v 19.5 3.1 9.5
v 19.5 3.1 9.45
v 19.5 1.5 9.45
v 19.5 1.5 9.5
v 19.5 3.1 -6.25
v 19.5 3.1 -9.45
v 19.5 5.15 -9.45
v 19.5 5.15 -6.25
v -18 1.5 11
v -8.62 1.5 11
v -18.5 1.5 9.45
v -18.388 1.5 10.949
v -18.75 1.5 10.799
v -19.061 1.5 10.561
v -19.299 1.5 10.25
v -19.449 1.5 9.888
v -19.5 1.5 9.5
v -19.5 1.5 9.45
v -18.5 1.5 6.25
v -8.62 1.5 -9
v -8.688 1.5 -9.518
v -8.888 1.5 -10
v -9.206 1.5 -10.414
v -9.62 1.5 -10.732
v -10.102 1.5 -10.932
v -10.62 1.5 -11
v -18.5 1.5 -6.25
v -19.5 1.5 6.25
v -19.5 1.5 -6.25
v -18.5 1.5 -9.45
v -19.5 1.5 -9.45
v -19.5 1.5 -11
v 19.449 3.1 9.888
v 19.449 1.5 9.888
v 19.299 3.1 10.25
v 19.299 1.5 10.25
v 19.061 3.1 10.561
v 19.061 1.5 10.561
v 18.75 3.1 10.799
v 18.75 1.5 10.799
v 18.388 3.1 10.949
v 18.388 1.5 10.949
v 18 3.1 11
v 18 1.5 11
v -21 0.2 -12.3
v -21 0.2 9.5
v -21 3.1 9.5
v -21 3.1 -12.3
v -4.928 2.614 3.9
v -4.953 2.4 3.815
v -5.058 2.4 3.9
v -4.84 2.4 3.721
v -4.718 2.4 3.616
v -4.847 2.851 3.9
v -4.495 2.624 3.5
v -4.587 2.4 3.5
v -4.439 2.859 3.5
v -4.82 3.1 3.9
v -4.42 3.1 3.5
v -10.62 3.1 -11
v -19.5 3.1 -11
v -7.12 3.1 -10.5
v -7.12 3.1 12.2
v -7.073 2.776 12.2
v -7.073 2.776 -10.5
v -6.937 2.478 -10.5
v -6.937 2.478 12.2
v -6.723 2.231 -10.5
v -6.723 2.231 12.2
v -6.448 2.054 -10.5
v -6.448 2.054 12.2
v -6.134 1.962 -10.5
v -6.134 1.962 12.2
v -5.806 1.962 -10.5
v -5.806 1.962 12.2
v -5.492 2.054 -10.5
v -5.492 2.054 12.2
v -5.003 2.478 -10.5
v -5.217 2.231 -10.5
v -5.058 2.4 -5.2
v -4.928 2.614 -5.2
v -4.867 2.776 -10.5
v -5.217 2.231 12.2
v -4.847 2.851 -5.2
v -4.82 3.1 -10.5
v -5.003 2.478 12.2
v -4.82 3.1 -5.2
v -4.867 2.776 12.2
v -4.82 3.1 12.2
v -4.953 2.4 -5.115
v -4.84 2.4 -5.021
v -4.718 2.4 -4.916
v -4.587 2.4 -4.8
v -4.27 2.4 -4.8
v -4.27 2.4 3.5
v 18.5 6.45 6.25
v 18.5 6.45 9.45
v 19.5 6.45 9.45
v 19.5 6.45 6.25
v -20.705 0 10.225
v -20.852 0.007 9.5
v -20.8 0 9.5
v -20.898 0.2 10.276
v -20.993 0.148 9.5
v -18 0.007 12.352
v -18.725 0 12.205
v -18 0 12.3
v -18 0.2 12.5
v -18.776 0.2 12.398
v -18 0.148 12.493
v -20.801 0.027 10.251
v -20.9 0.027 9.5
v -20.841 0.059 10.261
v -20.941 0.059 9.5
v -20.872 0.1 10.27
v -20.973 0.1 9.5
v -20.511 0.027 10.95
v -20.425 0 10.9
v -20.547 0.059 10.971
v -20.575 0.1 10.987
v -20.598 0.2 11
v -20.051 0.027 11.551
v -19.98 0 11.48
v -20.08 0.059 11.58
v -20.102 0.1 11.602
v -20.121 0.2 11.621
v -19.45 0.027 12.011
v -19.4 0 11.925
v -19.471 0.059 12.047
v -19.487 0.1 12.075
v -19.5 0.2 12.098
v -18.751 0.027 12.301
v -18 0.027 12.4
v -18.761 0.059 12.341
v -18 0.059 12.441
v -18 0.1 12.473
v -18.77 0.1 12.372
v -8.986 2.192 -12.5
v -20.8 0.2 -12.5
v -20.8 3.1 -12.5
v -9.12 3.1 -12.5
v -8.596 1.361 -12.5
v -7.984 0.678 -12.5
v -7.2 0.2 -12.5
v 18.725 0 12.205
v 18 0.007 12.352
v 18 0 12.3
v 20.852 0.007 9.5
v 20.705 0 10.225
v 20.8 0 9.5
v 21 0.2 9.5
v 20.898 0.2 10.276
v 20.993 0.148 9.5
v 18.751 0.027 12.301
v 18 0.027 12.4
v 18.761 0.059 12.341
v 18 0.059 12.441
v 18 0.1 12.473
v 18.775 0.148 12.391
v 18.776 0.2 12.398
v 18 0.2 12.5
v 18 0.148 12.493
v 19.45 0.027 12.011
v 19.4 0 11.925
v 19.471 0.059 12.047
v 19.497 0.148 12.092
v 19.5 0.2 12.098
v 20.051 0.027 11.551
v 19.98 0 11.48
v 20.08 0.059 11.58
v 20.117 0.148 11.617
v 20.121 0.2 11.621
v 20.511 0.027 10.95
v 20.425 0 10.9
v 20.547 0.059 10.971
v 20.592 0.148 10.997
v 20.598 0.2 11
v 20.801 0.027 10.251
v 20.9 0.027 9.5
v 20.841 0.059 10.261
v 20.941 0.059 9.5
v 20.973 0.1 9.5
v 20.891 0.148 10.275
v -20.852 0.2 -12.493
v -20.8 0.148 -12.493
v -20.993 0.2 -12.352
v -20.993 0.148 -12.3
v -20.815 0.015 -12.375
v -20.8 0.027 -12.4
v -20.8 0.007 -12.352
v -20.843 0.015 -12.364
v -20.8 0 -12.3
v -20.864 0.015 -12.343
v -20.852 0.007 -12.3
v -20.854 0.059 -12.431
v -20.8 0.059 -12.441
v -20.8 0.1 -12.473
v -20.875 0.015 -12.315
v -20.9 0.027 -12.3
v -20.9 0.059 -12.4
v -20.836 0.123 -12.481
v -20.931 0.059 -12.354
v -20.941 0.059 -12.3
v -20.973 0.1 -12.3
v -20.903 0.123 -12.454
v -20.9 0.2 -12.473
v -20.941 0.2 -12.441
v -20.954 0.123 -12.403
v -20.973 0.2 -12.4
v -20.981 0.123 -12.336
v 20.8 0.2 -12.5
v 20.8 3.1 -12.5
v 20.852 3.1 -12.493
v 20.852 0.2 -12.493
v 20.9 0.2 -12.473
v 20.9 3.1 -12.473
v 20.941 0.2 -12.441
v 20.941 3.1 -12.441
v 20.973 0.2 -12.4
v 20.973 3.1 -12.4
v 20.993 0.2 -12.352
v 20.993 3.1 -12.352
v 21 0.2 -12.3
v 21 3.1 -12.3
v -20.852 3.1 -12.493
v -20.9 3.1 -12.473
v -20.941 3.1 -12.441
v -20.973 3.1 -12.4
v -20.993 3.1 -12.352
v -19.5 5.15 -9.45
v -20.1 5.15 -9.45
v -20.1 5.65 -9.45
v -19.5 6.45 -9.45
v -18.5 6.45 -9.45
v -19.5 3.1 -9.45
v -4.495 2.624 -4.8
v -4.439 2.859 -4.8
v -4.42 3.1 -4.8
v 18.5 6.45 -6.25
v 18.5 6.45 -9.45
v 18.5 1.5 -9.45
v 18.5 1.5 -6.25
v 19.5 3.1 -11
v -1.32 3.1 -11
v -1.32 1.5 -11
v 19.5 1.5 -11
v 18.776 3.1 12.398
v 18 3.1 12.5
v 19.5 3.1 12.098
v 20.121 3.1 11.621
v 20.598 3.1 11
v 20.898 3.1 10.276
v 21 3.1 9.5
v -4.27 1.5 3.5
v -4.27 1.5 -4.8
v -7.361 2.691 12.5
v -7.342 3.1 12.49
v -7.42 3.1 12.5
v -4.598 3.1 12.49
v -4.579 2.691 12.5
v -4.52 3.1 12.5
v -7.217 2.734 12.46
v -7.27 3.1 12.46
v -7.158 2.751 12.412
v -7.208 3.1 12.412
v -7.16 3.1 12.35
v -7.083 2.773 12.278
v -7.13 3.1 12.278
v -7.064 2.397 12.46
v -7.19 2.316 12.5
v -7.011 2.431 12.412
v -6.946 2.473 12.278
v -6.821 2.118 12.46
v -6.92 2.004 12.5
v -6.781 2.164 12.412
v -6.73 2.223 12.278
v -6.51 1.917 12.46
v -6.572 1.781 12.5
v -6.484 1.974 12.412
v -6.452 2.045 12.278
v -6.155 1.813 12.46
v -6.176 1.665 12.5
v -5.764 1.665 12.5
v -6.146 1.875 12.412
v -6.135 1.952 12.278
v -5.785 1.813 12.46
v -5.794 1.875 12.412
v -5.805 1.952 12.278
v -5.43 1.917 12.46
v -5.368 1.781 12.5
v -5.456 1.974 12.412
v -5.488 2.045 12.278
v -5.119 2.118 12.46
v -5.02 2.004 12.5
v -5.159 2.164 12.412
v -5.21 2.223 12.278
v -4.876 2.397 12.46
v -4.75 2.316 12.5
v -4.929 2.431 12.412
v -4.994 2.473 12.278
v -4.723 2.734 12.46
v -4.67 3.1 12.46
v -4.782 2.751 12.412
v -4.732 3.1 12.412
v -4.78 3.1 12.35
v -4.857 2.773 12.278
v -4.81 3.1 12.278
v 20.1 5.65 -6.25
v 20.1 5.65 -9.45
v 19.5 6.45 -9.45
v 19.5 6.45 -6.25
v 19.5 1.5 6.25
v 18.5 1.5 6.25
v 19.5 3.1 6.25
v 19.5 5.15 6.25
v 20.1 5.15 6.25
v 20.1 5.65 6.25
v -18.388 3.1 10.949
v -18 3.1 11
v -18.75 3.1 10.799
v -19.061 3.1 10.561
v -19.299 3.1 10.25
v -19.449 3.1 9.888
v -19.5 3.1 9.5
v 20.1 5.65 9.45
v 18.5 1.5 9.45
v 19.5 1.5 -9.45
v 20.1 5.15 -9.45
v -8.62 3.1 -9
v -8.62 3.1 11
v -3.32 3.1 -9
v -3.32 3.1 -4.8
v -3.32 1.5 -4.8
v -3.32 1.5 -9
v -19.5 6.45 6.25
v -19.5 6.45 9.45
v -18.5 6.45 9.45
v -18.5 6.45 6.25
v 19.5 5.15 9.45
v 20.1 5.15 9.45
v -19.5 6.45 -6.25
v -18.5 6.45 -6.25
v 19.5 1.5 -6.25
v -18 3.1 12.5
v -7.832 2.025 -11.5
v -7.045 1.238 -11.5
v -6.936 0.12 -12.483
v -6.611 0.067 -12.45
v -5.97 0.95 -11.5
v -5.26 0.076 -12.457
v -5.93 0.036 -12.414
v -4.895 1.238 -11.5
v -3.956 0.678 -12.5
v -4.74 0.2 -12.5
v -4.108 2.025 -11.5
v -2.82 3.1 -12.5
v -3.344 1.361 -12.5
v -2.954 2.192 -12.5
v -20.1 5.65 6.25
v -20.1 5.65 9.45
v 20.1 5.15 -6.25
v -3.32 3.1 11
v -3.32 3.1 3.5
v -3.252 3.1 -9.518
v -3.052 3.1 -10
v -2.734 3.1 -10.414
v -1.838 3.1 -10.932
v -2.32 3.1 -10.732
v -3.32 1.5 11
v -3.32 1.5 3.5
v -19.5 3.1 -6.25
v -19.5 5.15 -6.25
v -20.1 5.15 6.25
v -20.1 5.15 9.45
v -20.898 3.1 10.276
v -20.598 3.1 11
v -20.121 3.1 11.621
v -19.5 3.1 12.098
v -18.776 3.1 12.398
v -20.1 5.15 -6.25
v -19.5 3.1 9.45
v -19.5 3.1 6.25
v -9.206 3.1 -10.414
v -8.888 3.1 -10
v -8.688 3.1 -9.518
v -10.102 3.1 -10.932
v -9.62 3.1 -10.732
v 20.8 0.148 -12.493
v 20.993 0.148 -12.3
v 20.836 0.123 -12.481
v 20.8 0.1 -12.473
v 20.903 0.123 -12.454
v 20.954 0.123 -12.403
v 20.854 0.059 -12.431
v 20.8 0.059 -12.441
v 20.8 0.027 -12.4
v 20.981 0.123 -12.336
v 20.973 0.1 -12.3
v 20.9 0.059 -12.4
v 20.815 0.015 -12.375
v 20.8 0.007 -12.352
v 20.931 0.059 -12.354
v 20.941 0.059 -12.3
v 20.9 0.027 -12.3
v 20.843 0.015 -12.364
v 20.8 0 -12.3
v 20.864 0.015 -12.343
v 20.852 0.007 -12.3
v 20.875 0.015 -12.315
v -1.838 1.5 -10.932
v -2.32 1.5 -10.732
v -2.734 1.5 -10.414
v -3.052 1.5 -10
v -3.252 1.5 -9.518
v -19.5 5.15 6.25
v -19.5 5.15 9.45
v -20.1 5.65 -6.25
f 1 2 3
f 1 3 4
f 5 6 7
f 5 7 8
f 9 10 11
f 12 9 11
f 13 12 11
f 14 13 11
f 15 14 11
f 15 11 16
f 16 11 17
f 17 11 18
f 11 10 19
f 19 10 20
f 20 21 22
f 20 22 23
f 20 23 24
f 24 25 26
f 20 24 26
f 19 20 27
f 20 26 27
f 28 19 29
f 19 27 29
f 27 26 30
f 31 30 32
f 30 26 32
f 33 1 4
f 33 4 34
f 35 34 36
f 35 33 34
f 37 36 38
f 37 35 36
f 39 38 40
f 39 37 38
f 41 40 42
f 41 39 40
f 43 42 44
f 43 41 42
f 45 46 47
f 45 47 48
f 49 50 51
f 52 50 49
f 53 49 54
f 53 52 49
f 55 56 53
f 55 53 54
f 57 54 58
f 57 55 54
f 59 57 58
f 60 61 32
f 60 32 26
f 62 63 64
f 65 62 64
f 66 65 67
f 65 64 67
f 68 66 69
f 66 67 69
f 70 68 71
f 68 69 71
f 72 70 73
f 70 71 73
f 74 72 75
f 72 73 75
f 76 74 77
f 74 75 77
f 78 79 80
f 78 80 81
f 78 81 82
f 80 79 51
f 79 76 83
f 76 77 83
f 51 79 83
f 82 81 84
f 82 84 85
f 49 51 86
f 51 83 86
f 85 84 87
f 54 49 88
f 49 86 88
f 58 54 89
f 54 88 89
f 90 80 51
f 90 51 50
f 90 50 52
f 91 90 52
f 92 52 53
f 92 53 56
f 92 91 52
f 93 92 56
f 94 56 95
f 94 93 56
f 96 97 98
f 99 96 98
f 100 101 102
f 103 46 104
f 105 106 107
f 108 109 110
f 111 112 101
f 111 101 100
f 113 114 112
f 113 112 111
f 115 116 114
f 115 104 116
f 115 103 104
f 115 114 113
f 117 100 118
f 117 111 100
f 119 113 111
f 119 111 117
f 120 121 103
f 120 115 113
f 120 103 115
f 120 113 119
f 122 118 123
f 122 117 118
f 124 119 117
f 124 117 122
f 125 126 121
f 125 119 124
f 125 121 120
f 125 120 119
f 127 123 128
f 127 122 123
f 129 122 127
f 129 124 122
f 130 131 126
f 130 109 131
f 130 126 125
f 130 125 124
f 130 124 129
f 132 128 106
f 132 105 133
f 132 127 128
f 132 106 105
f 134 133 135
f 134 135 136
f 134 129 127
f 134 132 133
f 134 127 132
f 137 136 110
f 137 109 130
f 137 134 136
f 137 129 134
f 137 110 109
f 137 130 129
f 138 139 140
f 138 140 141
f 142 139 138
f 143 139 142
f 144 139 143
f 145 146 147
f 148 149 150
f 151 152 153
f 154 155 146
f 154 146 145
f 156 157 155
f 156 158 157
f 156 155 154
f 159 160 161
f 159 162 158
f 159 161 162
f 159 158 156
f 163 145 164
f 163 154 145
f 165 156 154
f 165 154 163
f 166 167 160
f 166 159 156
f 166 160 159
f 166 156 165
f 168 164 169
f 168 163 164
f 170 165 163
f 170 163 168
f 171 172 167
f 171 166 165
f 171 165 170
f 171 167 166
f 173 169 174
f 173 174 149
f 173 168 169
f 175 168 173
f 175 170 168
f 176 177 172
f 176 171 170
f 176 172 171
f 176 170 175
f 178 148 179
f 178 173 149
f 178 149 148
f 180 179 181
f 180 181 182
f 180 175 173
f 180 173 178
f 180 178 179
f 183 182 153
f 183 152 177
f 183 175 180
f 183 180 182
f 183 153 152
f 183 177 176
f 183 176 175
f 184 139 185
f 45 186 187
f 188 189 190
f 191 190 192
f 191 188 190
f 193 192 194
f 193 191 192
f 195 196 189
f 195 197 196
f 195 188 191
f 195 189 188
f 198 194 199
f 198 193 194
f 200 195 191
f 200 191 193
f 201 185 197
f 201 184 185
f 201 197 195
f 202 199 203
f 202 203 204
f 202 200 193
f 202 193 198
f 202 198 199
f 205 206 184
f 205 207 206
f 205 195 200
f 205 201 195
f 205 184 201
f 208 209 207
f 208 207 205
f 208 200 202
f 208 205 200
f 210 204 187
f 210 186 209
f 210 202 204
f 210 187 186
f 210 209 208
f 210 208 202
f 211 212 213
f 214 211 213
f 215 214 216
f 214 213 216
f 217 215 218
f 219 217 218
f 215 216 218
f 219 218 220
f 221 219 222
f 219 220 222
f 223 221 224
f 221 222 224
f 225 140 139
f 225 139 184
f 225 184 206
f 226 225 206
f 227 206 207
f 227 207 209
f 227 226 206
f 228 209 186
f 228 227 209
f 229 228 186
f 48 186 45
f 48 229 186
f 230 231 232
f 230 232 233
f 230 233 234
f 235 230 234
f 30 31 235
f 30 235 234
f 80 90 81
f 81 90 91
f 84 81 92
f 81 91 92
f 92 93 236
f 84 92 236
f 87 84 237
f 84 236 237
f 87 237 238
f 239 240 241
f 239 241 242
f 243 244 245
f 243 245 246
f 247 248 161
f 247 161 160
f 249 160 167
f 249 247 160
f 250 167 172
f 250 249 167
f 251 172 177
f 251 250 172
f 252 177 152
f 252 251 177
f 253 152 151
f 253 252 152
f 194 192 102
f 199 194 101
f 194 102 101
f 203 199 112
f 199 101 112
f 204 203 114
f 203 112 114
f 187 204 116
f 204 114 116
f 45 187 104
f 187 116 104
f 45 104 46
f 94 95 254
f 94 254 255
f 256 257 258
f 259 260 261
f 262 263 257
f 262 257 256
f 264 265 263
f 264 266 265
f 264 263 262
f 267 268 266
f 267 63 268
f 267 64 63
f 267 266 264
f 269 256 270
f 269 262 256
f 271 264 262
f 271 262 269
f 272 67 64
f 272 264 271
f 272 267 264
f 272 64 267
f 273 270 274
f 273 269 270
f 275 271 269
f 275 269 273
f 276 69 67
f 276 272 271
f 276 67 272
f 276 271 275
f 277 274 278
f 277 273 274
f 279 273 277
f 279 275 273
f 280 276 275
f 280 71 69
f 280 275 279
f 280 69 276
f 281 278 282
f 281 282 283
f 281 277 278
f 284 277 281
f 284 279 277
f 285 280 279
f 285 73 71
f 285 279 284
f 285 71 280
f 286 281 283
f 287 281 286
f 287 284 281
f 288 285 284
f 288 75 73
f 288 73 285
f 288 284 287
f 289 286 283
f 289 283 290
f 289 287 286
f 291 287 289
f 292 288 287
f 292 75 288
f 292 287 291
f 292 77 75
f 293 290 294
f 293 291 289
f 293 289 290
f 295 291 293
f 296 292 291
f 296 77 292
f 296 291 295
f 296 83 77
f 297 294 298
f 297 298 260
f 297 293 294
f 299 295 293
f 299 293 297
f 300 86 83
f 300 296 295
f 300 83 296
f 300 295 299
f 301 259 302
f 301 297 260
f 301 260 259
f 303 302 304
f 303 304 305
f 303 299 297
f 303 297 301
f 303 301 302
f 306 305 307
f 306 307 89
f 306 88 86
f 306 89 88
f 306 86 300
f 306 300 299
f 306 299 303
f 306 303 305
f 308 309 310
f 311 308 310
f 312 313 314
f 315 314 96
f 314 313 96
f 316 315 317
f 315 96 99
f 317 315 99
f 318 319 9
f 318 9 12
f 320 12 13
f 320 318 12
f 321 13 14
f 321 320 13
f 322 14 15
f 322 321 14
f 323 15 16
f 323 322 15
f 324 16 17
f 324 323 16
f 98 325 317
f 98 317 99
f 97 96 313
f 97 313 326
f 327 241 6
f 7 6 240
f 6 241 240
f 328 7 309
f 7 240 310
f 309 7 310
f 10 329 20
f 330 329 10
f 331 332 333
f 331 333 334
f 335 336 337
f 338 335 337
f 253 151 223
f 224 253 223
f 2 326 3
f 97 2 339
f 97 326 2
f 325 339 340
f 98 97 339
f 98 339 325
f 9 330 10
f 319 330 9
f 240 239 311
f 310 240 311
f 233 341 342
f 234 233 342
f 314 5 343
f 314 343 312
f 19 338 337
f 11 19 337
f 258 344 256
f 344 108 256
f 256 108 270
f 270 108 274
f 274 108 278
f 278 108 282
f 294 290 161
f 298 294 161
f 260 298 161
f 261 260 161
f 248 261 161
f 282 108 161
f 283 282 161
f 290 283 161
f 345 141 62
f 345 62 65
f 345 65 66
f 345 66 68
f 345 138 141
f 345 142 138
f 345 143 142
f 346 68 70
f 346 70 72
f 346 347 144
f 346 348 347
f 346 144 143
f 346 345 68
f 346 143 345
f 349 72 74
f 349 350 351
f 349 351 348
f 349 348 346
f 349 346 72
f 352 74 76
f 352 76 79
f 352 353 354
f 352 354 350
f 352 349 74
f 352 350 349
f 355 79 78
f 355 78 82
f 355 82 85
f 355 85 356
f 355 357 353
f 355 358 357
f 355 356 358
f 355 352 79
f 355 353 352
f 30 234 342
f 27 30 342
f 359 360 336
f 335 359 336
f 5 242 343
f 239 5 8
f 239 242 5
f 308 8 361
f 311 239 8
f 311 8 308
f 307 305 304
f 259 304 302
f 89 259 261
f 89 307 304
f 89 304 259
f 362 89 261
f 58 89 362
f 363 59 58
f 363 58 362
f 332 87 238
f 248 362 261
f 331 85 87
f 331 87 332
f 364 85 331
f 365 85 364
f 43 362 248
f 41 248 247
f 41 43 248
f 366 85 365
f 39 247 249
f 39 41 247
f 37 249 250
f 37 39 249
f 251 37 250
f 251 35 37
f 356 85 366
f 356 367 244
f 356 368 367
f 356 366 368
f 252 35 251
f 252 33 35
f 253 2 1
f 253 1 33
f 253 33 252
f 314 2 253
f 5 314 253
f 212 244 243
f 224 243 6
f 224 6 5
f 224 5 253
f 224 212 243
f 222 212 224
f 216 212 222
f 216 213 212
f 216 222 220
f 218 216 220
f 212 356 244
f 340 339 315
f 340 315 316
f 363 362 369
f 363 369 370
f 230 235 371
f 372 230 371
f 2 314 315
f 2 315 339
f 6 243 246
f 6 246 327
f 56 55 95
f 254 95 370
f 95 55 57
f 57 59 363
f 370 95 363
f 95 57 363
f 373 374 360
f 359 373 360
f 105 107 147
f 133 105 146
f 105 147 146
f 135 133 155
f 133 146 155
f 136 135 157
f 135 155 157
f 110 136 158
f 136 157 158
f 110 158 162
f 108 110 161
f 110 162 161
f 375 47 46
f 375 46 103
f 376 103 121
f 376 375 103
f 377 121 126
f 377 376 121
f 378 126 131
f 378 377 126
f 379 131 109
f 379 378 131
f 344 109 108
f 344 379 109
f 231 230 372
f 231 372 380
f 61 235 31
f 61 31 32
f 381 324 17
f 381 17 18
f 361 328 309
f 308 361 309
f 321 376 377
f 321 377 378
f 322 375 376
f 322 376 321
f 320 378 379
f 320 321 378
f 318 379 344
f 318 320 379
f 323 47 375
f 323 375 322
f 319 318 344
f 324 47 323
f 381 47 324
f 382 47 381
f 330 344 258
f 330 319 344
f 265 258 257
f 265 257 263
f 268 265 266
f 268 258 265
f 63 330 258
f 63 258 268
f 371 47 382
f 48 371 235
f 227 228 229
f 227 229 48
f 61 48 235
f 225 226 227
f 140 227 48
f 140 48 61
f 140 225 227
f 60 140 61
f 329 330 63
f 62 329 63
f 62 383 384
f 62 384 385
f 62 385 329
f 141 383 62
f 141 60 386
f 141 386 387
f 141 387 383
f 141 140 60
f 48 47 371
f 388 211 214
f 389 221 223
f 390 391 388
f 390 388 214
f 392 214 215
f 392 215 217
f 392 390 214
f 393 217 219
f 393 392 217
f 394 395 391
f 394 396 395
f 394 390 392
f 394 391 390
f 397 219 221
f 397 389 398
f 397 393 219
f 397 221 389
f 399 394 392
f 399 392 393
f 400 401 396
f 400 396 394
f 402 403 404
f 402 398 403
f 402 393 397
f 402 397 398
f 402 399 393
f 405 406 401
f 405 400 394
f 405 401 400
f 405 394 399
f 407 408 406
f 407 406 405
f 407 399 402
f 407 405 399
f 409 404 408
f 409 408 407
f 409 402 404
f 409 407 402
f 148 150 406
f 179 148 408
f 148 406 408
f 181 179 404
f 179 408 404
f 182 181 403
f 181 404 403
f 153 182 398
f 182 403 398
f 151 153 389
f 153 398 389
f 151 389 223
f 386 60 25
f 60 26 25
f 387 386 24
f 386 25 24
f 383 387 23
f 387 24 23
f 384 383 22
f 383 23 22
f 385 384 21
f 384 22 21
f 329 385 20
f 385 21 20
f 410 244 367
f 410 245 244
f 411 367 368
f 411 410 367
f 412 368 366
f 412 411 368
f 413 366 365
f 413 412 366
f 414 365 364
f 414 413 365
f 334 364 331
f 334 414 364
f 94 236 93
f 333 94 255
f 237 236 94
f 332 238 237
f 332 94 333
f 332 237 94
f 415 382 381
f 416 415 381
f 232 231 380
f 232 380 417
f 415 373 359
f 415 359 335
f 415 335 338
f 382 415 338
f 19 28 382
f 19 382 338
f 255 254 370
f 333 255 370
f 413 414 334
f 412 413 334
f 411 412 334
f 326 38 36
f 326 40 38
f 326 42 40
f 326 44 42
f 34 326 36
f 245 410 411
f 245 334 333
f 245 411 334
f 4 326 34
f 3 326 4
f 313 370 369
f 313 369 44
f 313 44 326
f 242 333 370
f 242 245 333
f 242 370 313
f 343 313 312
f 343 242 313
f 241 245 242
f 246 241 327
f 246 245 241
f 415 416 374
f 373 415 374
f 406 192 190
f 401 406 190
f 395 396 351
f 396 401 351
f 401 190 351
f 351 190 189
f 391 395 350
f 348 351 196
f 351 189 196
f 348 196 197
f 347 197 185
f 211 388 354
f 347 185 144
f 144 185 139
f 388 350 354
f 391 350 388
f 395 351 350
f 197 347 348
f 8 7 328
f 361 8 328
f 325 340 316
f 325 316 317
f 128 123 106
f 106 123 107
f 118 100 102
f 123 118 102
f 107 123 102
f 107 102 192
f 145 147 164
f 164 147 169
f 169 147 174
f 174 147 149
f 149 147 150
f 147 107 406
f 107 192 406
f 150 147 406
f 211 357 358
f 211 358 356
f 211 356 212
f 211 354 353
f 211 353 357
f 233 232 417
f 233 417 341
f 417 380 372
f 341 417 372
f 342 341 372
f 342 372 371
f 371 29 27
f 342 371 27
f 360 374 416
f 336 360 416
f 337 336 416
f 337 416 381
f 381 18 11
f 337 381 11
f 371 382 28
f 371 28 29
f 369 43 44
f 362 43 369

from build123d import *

# Parameters (mm, degrees)
SKETCH_1_W          = 42
SKETCH_1_H          = 25
EXTRUDE_1_DEPTH     = 3.1
SKETCH_3_R          = 1.15
CUT_EXTRUDE_1_DEPTH = 33.796493715
SKETCH_5_W          = 15.7
SKETCH_5_H          = 8.3
CUT_EXTRUDE_3_DEPTH = 1.6
FILLET_4_R          = 3
SKETCH_10_W         = 1.324084548
SKETCH_10_H         = 8.3
CUT_EXTRUDE_4_DEPTH = 0.7
CUT_EXTRUDE_5_DEPTH = 1.6
FILLET_5_R          = 0.3
CHAMFER_1_SIZE      = 0.4
CHAMFER_2_SIZE      = 2
FILLET_6_R          = 2
SKETCH_13_W         = 1
SKETCH_13_H         = 3.2
EXTRUDE_2_DEPTH     = 4.95
EXTRUDE_3_DEPTH     = 3.2
FILLET_7_R          = 0.2
FILLET_8_R          = 0.2


with BuildPart() as part:
    # 草图1 → 凸台-拉伸1 (new body)
    with BuildSketch(Plane(origin=(0, 0, 0), x_dir=(1, 0, 0), z_dir=(0, 1, 0))):
        Rectangle(SKETCH_1_W, SKETCH_1_H)
    extrude(amount=EXTRUDE_1_DEPTH)

    # 草图3 → 切除-拉伸1 (cut, through all)
    with BuildSketch(Plane.XY.offset(12.5)):
        with Locations((-5.97, 3.1)):
            Circle(SKETCH_3_R)
    extrude(amount=-CUT_EXTRUDE_1_DEPTH, mode=Mode.SUBTRACT)

    # 草图5 → 切除-拉伸3 (cut)
    with BuildSketch(Plane(origin=(0, 3.1, 0), x_dir=(1, 0, 0), z_dir=(0, 1, 0))):
        with Locations((3.58, 0.65)):
            Rectangle(SKETCH_5_W, SKETCH_5_H)
    extrude(amount=-CUT_EXTRUDE_3_DEPTH, mode=Mode.SUBTRACT)

    # 圆角4
    fillet_4_edges = [part.edges().sort_by_distance(p)[0] for p in [
        (-21, 1.55, 12.5),
        (21, 1.55, 12.5),
    ]]
    fillet(fillet_4_edges, radius=FILLET_4_R)

    # 草图10 → 切除-拉伸4 (cut)
    with BuildSketch(Plane(origin=(0, 3.1, 0), x_dir=(1, 0, 0), z_dir=(0, 1, 0))):
        with Locations((-4.932042274, 0.65)):
            Rectangle(SKETCH_10_W, SKETCH_10_H)
    extrude(amount=-CUT_EXTRUDE_4_DEPTH, mode=Mode.SUBTRACT)

    # 草图11 → 切除-拉伸5 (cut)
    with BuildSketch(Plane(origin=(0, 3.1, 0), x_dir=(1, 0, 0), z_dir=(0, 1, 0))):
        with BuildLine():
            Line((-3.32, -11), (-3.32, 11))
            Line((-3.32, 11), (19.5, 11))
            Line((19.5, 11), (19.5, -9.5))
            ThreePointArc((19.5, -9.5), (19.060660172, -10.560660172), (18, -11))
            Line((18, -11), (-3.32, -11))
        make_face()
        with BuildLine():
            Line((-19.5, 11), (-8.62, 11))
            Line((-8.62, 11), (-8.62, -11))
            Line((-8.62, -11), (-18, -11))
            ThreePointArc((-18, -11), (-19.060660172, -10.560660172), (-19.5, -9.5))
            Line((-19.5, -9.5), (-19.5, 11))
        make_face()
    extrude(amount=-CUT_EXTRUDE_5_DEPTH, mode=Mode.SUBTRACT)

    # 圆角5
    fillet_5_edges = [part.edges().sort_by_distance(p)[0] for p in [
        (-5.97, 1.95, 12.5),
    ]]
    fillet(fillet_5_edges, radius=FILLET_5_R)

    # 倒角1
    chamfer_1_edges = [part.edges().sort_by_distance(p)[0] for p in [
        (-4.881015028, 2.730389757, 3.5),
        (-4.881015028, 2.730389757, -4.8),
    ]]
    chamfer(chamfer_1_edges, length=CHAMFER_1_SIZE)

    # 倒角2
    # the kernel refuses this chamfer: 2 mm, written as the material it takes off along each edge
    with BuildSketch(Plane(origin=(-5.97, 3.1, -12.5), x_dir=(-0.0031415874858793974, 0.9999950652018581, 0), z_dir=(0.9999950652018581, 0.0031415874858793974, 0))) as chamfer_2_piece_1:
        Polygon((1.15, CHAMFER_2_SIZE), (1.15 + CHAMFER_2_SIZE, 0), (1.15, 0), align=None)
    revolve(axis=Axis((-5.97, 3.1, -12.5), (0, 0, 1)), revolution_arc=359.64, mode=Mode.SUBTRACT)

    # 圆角6
    fillet_6_edges = [part.edges().sort_by_distance(p)[0] for p in [
        (-3.32, 2.3, -11),
        (-8.62, 2.3, -11),
    ]]
    fillet(fillet_6_edges, radius=FILLET_6_R)

    # 草图13 → 凸台-拉伸2 (add)
    with BuildSketch(Plane.XZ.offset(-1.5)):
        with Locations((19, 7.85)):
            Rectangle(SKETCH_13_W, SKETCH_13_H)
        with Locations((19, -7.85)):
            Rectangle(SKETCH_13_W, SKETCH_13_H)
        with Locations((-19, -7.85)):
            Rectangle(SKETCH_13_W, SKETCH_13_H)
        with Locations((-19, 7.85)):
            Rectangle(SKETCH_13_W, SKETCH_13_H)
    extrude(amount=-EXTRUDE_2_DEPTH)

    # 草图14 → 凸台-拉伸3 (add)
    with BuildSketch(Plane(origin=(0, 0, -9.45), x_dir=(-1, 0, 0), z_dir=(0, 0, -1))):
        Polygon((-19.5, 6.45), (-19.5, 5.15), (-20.1, 5.15), (-20.1, 5.65), align=None)
        Polygon((20.1, 5.65), (19.5, 6.45), (19.5, 5.15), (20.1, 5.15), align=None)
    extrude_3 = extrude(amount=-EXTRUDE_3_DEPTH)

    # 镜向1: 凸台-拉伸3 across plane
    add(extrude_3.mirror(Plane.XY))

    # 圆角7
    fillet_7_edges = [part.edges().sort_by_distance(p)[0] for p in [
        (-21, 1.55, -12.5),
        (21, 1.55, -12.5),
    ]]
    fillet(fillet_7_edges, radius=FILLET_7_R)

    # 圆角8
    # the kernel refuses this fillet: 0.2 mm, written as the material it takes off along each edge
    with BuildSketch(Plane(origin=(-20.8, 0, -12.3), x_dir=(0, 0, -1), z_dir=(1, 0, 0))) as fillet_8_piece_1:
        with BuildLine():
            CenterArc((0.2 - FILLET_8_R, FILLET_8_R), FILLET_8_R, 270, 90)
            Line((0.2, FILLET_8_R), (0.2 + FILLET_8_R * 0.02, FILLET_8_R))
            Line((0.2 + FILLET_8_R * 0.02, FILLET_8_R), (0.2 + FILLET_8_R * 0.02, -FILLET_8_R * 0.02))
            Line((0.2 + FILLET_8_R * 0.02, -FILLET_8_R * 0.02), (0.2 - FILLET_8_R, -FILLET_8_R * 0.02))
            Line((0.2 - FILLET_8_R, -FILLET_8_R * 0.02), (0.2 - FILLET_8_R, 0))
        make_face()
    revolve(axis=Axis((-20.8, 0, -12.3), (0, 1, 0)), revolution_arc=90, mode=Mode.SUBTRACT)
    with BuildSketch(Plane(origin=(-21, 0, 9.5), x_dir=(1, 0, 0), z_dir=(0, 0, -1))) as fillet_8_piece_2:
        with BuildLine():
            CenterArc((FILLET_8_R, -FILLET_8_R), FILLET_8_R, 90, 90)
            Line((0, -FILLET_8_R), (-FILLET_8_R * 0.02, -FILLET_8_R))
            Line((-FILLET_8_R * 0.02, -FILLET_8_R), (-FILLET_8_R * 0.02, FILLET_8_R * 0.02))
            Line((-FILLET_8_R * 0.02, FILLET_8_R * 0.02), (FILLET_8_R, FILLET_8_R * 0.02))
            Line((FILLET_8_R, FILLET_8_R * 0.02), (FILLET_8_R, 0))
        make_face()
    extrude(amount=21.8, mode=Mode.SUBTRACT)
    with BuildSketch(Plane(origin=(-18, 0, 9.5), x_dir=(-1, 0, 0), z_dir=(0, 0, -1))) as fillet_8_piece_3:
        with BuildLine():
            CenterArc((3 - FILLET_8_R, FILLET_8_R), FILLET_8_R, 270, 90)
            Line((3, FILLET_8_R), (3 + FILLET_8_R * 0.02, FILLET_8_R))
            Line((3 + FILLET_8_R * 0.02, FILLET_8_R), (3 + FILLET_8_R * 0.02, -FILLET_8_R * 0.02))
            Line((3 + FILLET_8_R * 0.02, -FILLET_8_R * 0.02), (3 - FILLET_8_R, -FILLET_8_R * 0.02))
            Line((3 - FILLET_8_R, -FILLET_8_R * 0.02), (3 - FILLET_8_R, 0))
        make_face()
    revolve(axis=Axis((-18, 0, 9.5), (0, 1, 0)), revolution_arc=90, mode=Mode.SUBTRACT)
    with BuildSketch(Plane(origin=(18, 0, 12.5), x_dir=(0, 1, 0), z_dir=(-1, 0, 0))) as fillet_8_piece_4:
        with BuildLine():
            CenterArc((FILLET_8_R, FILLET_8_R), FILLET_8_R, 180, 90)
            Line((0, FILLET_8_R), (-FILLET_8_R * 0.02, FILLET_8_R))
            Line((-FILLET_8_R * 0.02, FILLET_8_R), (-FILLET_8_R * 0.02, -FILLET_8_R * 0.02))
            Line((-FILLET_8_R * 0.02, -FILLET_8_R * 0.02), (FILLET_8_R, -FILLET_8_R * 0.02))
            Line((FILLET_8_R, -FILLET_8_R * 0.02), (FILLET_8_R, 0))
        make_face()
    extrude(amount=36, mode=Mode.SUBTRACT)
    with BuildSketch(Plane(origin=(18, 0, 9.5), x_dir=(0, 0, 1), z_dir=(-1, 0, 0))) as fillet_8_piece_5:
        with BuildLine():
            CenterArc((3 - FILLET_8_R, FILLET_8_R), FILLET_8_R, 270, 90)
            Line((3 - FILLET_8_R, 0), (3 - FILLET_8_R, -FILLET_8_R * 0.02))
            Line((3 - FILLET_8_R, -FILLET_8_R * 0.02), (3 + FILLET_8_R * 0.02, -FILLET_8_R * 0.02))
            Line((3 + FILLET_8_R * 0.02, -FILLET_8_R * 0.02), (3 + FILLET_8_R * 0.02, FILLET_8_R))
            Line((3 + FILLET_8_R * 0.02, FILLET_8_R), (3, FILLET_8_R))
        make_face()
    revolve(axis=Axis((18, 0, 9.5), (0, 1, 0)), revolution_arc=90, mode=Mode.SUBTRACT)
    with BuildSketch(Plane(origin=(21, 0, -12.3), x_dir=(0, 1, 0), z_dir=(0, 0, 1))) as fillet_8_piece_6:
        with BuildLine():
            CenterArc((FILLET_8_R, FILLET_8_R), FILLET_8_R, 180, 90)
            Line((0, FILLET_8_R), (-FILLET_8_R * 0.02, FILLET_8_R))
            Line((-FILLET_8_R * 0.02, FILLET_8_R), (-FILLET_8_R * 0.02, -FILLET_8_R * 0.02))
            Line((-FILLET_8_R * 0.02, -FILLET_8_R * 0.02), (FILLET_8_R, -FILLET_8_R * 0.02))
            Line((FILLET_8_R, -FILLET_8_R * 0.02), (FILLET_8_R, 0))
        make_face()
    extrude(amount=21.8, mode=Mode.SUBTRACT)
    with BuildSketch(Plane(origin=(20.8, 0, -12.3), x_dir=(0, 0, -1), z_dir=(-1, 0, 0))) as fillet_8_piece_7:
        with BuildLine():
            CenterArc((0.2 - FILLET_8_R, -FILLET_8_R), FILLET_8_R, 0, 90)
            Line((0.2 - FILLET_8_R, 0), (0.2 - FILLET_8_R, FILLET_8_R * 0.02))
            Line((0.2 - FILLET_8_R, FILLET_8_R * 0.02), (0.2 + FILLET_8_R * 0.02, FILLET_8_R * 0.02))
            Line((0.2 + FILLET_8_R * 0.02, FILLET_8_R * 0.02), (0.2 + FILLET_8_R * 0.02, -FILLET_8_R))
            Line((0.2 + FILLET_8_R * 0.02, -FILLET_8_R), (0.2, -FILLET_8_R))
        make_face()
    revolve(axis=Axis((20.8, 0, -12.3), (0, -1, 0)), revolution_arc=90, mode=Mode.SUBTRACT)
    with BuildSketch(Plane(origin=(-6.610983006, 0, -12.5), x_dir=(0, 1, 0), z_dir=(1, 0, 0))) as fillet_8_piece_8:
        with BuildLine():
            CenterArc((FILLET_8_R, FILLET_8_R), FILLET_8_R, 180, 90)
            Line((0, FILLET_8_R), (-FILLET_8_R * 0.02, FILLET_8_R))
            Line((-FILLET_8_R * 0.02, FILLET_8_R), (-FILLET_8_R * 0.02, -FILLET_8_R * 0.02))
            Line((-FILLET_8_R * 0.02, -FILLET_8_R * 0.02), (FILLET_8_R, -FILLET_8_R * 0.02))
            Line((FILLET_8_R, -FILLET_8_R * 0.02), (FILLET_8_R, 0))
        make_face()
    extrude(amount=27.410983006, mode=Mode.SUBTRACT)
    with BuildSketch(Plane(origin=(-20.8, 0, -12.5), x_dir=(0, 0, 1), z_dir=(1, 0, 0))) as fillet_8_piece_9:
        with BuildLine():
            CenterArc((FILLET_8_R, -FILLET_8_R), FILLET_8_R, 90, 90)
            Line((0, -FILLET_8_R), (-FILLET_8_R * 0.02, -FILLET_8_R))
            Line((-FILLET_8_R * 0.02, -FILLET_8_R), (-FILLET_8_R * 0.02, FILLET_8_R * 0.02))
            Line((-FILLET_8_R * 0.02, FILLET_8_R * 0.02), (FILLET_8_R, FILLET_8_R * 0.02))
            Line((FILLET_8_R, FILLET_8_R * 0.02), (FILLET_8_R, 0))
        make_face()
    extrude(amount=15.470983006, mode=Mode.SUBTRACT)


solid = part.part
